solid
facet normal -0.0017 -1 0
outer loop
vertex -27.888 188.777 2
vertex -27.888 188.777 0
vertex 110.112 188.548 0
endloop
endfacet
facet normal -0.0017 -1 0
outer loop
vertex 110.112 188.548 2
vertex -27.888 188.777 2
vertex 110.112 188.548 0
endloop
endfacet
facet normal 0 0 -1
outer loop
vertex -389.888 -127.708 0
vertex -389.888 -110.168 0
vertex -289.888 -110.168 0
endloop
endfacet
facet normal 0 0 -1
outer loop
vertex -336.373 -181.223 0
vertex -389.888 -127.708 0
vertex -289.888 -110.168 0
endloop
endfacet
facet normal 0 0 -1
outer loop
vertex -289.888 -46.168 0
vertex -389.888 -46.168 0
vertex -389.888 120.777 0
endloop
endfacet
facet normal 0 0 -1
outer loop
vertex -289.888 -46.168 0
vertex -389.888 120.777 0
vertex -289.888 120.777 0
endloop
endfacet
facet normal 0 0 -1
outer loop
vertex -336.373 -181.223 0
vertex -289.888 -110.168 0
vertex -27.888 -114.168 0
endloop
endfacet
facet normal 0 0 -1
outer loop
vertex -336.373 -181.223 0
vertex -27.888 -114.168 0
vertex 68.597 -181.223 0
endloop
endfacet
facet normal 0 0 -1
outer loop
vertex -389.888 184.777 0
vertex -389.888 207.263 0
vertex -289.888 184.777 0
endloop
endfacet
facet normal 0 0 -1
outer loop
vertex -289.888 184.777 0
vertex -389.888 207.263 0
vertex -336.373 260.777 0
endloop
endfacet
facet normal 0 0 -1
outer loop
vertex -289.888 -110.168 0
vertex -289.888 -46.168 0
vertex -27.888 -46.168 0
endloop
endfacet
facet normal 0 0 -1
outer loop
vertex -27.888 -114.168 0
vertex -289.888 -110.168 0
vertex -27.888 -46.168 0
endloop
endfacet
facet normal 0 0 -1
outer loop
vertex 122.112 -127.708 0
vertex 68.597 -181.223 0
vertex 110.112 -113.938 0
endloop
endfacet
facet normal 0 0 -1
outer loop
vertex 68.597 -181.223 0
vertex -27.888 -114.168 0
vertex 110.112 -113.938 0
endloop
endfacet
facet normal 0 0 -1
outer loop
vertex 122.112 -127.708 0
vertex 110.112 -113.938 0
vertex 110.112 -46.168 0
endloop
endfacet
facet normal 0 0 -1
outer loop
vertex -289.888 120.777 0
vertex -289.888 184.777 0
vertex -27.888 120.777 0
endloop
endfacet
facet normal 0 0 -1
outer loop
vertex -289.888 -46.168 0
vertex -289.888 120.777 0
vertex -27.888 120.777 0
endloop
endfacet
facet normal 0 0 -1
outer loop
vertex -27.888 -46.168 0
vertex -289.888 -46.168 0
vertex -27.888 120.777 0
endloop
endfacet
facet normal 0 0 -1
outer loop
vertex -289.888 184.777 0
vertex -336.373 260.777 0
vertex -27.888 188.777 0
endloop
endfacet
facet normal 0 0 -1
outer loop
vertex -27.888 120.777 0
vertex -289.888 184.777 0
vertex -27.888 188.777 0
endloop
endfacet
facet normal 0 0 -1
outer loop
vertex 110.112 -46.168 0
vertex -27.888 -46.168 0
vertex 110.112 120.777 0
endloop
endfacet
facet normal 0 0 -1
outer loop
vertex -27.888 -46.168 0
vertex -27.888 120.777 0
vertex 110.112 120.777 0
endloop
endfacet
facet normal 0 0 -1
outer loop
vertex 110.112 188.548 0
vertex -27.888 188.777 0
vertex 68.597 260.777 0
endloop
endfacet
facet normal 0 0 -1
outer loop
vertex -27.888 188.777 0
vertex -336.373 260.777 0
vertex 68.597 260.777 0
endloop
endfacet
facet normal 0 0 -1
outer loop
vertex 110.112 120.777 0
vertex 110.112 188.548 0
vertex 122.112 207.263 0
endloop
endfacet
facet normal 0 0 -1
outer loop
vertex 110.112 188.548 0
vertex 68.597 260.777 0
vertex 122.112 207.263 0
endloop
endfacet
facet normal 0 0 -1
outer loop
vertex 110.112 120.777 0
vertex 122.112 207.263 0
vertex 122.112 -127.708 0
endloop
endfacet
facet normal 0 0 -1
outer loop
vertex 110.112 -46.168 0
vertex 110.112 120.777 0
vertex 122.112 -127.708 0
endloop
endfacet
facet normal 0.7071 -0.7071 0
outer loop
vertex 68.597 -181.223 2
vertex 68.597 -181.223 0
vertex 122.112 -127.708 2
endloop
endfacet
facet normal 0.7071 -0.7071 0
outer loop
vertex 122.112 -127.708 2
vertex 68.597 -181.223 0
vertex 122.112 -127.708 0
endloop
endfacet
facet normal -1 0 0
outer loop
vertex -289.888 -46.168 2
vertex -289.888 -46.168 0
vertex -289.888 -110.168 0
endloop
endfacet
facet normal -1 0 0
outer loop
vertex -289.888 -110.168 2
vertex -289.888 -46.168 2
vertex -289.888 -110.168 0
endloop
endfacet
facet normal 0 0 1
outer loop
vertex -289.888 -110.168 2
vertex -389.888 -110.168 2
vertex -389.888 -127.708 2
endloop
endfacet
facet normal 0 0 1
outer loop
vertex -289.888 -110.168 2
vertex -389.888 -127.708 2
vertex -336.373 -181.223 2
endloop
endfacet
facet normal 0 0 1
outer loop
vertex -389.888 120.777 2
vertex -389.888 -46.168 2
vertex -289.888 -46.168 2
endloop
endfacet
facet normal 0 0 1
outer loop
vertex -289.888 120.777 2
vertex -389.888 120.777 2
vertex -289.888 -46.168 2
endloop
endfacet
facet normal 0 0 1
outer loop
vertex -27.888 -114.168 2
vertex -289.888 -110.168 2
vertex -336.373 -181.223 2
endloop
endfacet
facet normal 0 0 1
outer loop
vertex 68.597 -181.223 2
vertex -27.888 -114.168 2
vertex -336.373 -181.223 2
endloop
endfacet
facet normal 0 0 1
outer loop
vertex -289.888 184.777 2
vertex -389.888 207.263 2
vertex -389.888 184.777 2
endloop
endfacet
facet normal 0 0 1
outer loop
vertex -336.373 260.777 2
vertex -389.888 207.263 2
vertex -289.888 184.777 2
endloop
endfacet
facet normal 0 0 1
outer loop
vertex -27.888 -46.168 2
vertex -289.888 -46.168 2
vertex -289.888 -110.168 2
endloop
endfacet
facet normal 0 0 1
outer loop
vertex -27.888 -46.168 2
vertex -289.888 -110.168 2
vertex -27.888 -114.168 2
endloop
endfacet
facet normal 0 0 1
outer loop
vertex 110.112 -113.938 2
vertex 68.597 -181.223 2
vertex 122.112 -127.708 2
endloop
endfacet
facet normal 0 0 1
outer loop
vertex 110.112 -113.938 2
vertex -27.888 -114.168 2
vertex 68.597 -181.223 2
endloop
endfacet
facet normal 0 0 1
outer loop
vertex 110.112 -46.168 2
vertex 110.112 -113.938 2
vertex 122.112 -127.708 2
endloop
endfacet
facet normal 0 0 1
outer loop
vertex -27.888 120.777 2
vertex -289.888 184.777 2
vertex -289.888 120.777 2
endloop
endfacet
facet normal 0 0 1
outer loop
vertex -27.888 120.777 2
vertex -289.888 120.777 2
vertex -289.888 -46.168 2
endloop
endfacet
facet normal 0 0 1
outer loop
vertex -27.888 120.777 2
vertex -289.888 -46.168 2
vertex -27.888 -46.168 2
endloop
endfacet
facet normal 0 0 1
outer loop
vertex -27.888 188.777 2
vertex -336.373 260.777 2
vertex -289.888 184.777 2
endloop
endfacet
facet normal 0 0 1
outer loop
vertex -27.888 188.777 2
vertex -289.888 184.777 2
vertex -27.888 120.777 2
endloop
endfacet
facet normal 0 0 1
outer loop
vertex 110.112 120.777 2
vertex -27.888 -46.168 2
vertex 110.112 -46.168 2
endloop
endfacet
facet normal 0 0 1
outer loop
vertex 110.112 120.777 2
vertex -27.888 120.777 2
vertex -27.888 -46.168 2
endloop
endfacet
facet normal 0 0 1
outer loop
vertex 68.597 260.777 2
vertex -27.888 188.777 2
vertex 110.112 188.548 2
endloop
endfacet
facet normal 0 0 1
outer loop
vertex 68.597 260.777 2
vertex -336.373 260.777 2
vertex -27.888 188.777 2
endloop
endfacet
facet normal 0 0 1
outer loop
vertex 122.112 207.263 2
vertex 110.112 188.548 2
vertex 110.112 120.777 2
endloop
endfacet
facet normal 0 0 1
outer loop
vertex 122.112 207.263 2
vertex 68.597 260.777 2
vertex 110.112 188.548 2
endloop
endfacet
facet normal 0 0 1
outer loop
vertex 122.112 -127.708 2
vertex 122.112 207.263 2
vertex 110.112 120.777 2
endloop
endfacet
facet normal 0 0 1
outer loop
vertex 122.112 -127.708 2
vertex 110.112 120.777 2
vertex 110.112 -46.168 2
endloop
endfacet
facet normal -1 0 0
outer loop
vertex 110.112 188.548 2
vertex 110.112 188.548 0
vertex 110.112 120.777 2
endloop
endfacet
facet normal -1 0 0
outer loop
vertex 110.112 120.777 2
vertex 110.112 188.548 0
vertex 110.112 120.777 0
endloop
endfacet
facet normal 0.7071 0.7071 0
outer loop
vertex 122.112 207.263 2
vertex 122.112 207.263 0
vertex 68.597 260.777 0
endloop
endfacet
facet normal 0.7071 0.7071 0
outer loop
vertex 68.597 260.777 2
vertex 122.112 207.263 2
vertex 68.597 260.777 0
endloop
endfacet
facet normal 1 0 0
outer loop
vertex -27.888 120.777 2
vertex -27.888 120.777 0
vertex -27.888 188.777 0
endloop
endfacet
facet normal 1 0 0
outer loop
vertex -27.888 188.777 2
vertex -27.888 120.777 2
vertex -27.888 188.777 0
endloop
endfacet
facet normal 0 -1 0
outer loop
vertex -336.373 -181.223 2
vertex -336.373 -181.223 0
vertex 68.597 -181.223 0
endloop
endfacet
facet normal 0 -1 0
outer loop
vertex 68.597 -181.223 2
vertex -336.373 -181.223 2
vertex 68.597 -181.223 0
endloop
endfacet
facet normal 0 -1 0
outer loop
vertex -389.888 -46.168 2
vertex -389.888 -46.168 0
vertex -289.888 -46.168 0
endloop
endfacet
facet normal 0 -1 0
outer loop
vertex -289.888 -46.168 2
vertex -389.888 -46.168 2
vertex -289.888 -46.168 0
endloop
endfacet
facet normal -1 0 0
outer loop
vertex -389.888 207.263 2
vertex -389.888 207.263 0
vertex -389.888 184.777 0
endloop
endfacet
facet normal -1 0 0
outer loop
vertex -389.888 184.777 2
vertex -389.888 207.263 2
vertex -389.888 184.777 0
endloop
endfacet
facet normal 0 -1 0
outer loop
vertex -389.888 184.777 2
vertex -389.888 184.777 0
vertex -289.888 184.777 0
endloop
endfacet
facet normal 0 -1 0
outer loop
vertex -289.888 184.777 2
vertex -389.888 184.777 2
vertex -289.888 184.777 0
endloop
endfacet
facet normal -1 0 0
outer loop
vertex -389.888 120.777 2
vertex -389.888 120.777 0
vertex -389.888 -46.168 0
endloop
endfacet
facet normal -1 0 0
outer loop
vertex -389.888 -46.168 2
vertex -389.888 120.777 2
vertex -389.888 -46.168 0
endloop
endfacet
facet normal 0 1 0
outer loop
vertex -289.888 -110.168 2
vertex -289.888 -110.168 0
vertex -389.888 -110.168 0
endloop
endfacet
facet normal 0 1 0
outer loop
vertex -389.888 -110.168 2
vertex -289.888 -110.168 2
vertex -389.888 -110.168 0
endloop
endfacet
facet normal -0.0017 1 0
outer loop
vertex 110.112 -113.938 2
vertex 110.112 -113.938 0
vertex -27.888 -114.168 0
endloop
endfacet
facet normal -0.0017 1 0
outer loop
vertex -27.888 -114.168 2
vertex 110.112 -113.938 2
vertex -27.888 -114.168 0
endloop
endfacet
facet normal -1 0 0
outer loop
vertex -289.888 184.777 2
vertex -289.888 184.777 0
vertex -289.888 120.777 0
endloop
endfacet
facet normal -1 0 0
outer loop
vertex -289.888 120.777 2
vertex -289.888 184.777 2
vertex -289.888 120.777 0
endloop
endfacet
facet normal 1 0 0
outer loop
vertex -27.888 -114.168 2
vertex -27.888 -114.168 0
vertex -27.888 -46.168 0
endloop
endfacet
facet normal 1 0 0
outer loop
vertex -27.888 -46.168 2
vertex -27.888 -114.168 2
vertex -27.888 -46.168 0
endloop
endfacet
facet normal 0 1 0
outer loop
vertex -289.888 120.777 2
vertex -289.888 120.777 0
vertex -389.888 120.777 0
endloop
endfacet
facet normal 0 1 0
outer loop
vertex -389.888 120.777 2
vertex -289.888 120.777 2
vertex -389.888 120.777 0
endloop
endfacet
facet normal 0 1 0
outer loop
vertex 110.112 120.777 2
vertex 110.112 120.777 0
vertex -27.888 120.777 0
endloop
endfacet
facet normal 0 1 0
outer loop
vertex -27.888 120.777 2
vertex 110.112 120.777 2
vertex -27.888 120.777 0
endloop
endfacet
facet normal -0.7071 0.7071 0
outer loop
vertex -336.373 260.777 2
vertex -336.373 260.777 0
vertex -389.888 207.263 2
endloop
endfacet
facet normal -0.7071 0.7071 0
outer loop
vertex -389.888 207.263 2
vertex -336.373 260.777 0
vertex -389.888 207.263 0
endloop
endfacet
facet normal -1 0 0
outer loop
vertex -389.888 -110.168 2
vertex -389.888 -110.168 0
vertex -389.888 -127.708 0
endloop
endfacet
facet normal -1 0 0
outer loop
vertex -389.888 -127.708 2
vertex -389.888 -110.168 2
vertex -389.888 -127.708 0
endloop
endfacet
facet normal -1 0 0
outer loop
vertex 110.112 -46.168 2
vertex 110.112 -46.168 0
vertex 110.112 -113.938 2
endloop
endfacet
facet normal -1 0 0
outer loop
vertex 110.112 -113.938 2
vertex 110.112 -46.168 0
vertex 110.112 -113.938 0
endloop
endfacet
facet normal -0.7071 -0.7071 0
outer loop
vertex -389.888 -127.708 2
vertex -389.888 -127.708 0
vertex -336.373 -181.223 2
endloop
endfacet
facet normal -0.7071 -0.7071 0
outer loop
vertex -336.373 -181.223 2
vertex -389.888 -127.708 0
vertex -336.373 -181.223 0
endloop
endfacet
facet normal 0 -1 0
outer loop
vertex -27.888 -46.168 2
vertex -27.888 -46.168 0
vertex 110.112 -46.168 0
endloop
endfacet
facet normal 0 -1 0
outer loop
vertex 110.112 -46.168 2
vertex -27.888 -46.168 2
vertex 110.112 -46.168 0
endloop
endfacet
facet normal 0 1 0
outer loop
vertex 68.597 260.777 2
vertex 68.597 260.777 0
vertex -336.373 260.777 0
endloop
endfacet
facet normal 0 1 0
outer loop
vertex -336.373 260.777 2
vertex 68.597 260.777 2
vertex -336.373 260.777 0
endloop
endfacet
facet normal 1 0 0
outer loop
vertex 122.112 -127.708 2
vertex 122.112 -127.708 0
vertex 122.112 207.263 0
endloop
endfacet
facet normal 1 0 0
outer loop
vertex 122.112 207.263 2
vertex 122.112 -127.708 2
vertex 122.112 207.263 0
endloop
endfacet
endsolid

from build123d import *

# Parameters (mm, degrees)
BOSS_EXTRU_1_DEPTH = 2


with BuildPart() as part:
    # Esquisse2 → Boss.-Extru.1 (new body)
    with BuildSketch(Plane.XY):
        Polygon((68.597300567, 260.777491871), (-336.373262181, 260.777491871), (-389.887980807, 207.262773245), (-389.887980807, 184.777491871), (-289.887980807, 184.777491871), (-289.887980807, 120.777491871), (-389.887980807, 120.777491871), (-389.887980807, -46.168159055), (-289.887980807, -46.168159055), (-289.887980807, -110.168159055), (-389.887980807, -110.168159055), (-389.887980807, -127.707789503), (-336.373262181, -181.222508129), (68.597300567, -181.222508129), (122.112019193, -127.707789503), (122.112019193, -46.168159055), (122.112019193, 120.777491871), (122.112019193, 207.262773245), align=None)
        Polygon((110.112019193, 120.777491871), (-27.887980807, 120.777491871), (-27.887980807, 188.777491871), (110.112019193, 188.547731592), align=None, mode=Mode.SUBTRACT)
        Polygon((-27.887980807, -114.168159055), (-27.887980807, -46.168159055), (110.112019193, -46.168159055), (110.112019193, -113.938398776), align=None, mode=Mode.SUBTRACT)
    extrude(amount=BOSS_EXTRU_1_DEPTH)


solid = part.part
